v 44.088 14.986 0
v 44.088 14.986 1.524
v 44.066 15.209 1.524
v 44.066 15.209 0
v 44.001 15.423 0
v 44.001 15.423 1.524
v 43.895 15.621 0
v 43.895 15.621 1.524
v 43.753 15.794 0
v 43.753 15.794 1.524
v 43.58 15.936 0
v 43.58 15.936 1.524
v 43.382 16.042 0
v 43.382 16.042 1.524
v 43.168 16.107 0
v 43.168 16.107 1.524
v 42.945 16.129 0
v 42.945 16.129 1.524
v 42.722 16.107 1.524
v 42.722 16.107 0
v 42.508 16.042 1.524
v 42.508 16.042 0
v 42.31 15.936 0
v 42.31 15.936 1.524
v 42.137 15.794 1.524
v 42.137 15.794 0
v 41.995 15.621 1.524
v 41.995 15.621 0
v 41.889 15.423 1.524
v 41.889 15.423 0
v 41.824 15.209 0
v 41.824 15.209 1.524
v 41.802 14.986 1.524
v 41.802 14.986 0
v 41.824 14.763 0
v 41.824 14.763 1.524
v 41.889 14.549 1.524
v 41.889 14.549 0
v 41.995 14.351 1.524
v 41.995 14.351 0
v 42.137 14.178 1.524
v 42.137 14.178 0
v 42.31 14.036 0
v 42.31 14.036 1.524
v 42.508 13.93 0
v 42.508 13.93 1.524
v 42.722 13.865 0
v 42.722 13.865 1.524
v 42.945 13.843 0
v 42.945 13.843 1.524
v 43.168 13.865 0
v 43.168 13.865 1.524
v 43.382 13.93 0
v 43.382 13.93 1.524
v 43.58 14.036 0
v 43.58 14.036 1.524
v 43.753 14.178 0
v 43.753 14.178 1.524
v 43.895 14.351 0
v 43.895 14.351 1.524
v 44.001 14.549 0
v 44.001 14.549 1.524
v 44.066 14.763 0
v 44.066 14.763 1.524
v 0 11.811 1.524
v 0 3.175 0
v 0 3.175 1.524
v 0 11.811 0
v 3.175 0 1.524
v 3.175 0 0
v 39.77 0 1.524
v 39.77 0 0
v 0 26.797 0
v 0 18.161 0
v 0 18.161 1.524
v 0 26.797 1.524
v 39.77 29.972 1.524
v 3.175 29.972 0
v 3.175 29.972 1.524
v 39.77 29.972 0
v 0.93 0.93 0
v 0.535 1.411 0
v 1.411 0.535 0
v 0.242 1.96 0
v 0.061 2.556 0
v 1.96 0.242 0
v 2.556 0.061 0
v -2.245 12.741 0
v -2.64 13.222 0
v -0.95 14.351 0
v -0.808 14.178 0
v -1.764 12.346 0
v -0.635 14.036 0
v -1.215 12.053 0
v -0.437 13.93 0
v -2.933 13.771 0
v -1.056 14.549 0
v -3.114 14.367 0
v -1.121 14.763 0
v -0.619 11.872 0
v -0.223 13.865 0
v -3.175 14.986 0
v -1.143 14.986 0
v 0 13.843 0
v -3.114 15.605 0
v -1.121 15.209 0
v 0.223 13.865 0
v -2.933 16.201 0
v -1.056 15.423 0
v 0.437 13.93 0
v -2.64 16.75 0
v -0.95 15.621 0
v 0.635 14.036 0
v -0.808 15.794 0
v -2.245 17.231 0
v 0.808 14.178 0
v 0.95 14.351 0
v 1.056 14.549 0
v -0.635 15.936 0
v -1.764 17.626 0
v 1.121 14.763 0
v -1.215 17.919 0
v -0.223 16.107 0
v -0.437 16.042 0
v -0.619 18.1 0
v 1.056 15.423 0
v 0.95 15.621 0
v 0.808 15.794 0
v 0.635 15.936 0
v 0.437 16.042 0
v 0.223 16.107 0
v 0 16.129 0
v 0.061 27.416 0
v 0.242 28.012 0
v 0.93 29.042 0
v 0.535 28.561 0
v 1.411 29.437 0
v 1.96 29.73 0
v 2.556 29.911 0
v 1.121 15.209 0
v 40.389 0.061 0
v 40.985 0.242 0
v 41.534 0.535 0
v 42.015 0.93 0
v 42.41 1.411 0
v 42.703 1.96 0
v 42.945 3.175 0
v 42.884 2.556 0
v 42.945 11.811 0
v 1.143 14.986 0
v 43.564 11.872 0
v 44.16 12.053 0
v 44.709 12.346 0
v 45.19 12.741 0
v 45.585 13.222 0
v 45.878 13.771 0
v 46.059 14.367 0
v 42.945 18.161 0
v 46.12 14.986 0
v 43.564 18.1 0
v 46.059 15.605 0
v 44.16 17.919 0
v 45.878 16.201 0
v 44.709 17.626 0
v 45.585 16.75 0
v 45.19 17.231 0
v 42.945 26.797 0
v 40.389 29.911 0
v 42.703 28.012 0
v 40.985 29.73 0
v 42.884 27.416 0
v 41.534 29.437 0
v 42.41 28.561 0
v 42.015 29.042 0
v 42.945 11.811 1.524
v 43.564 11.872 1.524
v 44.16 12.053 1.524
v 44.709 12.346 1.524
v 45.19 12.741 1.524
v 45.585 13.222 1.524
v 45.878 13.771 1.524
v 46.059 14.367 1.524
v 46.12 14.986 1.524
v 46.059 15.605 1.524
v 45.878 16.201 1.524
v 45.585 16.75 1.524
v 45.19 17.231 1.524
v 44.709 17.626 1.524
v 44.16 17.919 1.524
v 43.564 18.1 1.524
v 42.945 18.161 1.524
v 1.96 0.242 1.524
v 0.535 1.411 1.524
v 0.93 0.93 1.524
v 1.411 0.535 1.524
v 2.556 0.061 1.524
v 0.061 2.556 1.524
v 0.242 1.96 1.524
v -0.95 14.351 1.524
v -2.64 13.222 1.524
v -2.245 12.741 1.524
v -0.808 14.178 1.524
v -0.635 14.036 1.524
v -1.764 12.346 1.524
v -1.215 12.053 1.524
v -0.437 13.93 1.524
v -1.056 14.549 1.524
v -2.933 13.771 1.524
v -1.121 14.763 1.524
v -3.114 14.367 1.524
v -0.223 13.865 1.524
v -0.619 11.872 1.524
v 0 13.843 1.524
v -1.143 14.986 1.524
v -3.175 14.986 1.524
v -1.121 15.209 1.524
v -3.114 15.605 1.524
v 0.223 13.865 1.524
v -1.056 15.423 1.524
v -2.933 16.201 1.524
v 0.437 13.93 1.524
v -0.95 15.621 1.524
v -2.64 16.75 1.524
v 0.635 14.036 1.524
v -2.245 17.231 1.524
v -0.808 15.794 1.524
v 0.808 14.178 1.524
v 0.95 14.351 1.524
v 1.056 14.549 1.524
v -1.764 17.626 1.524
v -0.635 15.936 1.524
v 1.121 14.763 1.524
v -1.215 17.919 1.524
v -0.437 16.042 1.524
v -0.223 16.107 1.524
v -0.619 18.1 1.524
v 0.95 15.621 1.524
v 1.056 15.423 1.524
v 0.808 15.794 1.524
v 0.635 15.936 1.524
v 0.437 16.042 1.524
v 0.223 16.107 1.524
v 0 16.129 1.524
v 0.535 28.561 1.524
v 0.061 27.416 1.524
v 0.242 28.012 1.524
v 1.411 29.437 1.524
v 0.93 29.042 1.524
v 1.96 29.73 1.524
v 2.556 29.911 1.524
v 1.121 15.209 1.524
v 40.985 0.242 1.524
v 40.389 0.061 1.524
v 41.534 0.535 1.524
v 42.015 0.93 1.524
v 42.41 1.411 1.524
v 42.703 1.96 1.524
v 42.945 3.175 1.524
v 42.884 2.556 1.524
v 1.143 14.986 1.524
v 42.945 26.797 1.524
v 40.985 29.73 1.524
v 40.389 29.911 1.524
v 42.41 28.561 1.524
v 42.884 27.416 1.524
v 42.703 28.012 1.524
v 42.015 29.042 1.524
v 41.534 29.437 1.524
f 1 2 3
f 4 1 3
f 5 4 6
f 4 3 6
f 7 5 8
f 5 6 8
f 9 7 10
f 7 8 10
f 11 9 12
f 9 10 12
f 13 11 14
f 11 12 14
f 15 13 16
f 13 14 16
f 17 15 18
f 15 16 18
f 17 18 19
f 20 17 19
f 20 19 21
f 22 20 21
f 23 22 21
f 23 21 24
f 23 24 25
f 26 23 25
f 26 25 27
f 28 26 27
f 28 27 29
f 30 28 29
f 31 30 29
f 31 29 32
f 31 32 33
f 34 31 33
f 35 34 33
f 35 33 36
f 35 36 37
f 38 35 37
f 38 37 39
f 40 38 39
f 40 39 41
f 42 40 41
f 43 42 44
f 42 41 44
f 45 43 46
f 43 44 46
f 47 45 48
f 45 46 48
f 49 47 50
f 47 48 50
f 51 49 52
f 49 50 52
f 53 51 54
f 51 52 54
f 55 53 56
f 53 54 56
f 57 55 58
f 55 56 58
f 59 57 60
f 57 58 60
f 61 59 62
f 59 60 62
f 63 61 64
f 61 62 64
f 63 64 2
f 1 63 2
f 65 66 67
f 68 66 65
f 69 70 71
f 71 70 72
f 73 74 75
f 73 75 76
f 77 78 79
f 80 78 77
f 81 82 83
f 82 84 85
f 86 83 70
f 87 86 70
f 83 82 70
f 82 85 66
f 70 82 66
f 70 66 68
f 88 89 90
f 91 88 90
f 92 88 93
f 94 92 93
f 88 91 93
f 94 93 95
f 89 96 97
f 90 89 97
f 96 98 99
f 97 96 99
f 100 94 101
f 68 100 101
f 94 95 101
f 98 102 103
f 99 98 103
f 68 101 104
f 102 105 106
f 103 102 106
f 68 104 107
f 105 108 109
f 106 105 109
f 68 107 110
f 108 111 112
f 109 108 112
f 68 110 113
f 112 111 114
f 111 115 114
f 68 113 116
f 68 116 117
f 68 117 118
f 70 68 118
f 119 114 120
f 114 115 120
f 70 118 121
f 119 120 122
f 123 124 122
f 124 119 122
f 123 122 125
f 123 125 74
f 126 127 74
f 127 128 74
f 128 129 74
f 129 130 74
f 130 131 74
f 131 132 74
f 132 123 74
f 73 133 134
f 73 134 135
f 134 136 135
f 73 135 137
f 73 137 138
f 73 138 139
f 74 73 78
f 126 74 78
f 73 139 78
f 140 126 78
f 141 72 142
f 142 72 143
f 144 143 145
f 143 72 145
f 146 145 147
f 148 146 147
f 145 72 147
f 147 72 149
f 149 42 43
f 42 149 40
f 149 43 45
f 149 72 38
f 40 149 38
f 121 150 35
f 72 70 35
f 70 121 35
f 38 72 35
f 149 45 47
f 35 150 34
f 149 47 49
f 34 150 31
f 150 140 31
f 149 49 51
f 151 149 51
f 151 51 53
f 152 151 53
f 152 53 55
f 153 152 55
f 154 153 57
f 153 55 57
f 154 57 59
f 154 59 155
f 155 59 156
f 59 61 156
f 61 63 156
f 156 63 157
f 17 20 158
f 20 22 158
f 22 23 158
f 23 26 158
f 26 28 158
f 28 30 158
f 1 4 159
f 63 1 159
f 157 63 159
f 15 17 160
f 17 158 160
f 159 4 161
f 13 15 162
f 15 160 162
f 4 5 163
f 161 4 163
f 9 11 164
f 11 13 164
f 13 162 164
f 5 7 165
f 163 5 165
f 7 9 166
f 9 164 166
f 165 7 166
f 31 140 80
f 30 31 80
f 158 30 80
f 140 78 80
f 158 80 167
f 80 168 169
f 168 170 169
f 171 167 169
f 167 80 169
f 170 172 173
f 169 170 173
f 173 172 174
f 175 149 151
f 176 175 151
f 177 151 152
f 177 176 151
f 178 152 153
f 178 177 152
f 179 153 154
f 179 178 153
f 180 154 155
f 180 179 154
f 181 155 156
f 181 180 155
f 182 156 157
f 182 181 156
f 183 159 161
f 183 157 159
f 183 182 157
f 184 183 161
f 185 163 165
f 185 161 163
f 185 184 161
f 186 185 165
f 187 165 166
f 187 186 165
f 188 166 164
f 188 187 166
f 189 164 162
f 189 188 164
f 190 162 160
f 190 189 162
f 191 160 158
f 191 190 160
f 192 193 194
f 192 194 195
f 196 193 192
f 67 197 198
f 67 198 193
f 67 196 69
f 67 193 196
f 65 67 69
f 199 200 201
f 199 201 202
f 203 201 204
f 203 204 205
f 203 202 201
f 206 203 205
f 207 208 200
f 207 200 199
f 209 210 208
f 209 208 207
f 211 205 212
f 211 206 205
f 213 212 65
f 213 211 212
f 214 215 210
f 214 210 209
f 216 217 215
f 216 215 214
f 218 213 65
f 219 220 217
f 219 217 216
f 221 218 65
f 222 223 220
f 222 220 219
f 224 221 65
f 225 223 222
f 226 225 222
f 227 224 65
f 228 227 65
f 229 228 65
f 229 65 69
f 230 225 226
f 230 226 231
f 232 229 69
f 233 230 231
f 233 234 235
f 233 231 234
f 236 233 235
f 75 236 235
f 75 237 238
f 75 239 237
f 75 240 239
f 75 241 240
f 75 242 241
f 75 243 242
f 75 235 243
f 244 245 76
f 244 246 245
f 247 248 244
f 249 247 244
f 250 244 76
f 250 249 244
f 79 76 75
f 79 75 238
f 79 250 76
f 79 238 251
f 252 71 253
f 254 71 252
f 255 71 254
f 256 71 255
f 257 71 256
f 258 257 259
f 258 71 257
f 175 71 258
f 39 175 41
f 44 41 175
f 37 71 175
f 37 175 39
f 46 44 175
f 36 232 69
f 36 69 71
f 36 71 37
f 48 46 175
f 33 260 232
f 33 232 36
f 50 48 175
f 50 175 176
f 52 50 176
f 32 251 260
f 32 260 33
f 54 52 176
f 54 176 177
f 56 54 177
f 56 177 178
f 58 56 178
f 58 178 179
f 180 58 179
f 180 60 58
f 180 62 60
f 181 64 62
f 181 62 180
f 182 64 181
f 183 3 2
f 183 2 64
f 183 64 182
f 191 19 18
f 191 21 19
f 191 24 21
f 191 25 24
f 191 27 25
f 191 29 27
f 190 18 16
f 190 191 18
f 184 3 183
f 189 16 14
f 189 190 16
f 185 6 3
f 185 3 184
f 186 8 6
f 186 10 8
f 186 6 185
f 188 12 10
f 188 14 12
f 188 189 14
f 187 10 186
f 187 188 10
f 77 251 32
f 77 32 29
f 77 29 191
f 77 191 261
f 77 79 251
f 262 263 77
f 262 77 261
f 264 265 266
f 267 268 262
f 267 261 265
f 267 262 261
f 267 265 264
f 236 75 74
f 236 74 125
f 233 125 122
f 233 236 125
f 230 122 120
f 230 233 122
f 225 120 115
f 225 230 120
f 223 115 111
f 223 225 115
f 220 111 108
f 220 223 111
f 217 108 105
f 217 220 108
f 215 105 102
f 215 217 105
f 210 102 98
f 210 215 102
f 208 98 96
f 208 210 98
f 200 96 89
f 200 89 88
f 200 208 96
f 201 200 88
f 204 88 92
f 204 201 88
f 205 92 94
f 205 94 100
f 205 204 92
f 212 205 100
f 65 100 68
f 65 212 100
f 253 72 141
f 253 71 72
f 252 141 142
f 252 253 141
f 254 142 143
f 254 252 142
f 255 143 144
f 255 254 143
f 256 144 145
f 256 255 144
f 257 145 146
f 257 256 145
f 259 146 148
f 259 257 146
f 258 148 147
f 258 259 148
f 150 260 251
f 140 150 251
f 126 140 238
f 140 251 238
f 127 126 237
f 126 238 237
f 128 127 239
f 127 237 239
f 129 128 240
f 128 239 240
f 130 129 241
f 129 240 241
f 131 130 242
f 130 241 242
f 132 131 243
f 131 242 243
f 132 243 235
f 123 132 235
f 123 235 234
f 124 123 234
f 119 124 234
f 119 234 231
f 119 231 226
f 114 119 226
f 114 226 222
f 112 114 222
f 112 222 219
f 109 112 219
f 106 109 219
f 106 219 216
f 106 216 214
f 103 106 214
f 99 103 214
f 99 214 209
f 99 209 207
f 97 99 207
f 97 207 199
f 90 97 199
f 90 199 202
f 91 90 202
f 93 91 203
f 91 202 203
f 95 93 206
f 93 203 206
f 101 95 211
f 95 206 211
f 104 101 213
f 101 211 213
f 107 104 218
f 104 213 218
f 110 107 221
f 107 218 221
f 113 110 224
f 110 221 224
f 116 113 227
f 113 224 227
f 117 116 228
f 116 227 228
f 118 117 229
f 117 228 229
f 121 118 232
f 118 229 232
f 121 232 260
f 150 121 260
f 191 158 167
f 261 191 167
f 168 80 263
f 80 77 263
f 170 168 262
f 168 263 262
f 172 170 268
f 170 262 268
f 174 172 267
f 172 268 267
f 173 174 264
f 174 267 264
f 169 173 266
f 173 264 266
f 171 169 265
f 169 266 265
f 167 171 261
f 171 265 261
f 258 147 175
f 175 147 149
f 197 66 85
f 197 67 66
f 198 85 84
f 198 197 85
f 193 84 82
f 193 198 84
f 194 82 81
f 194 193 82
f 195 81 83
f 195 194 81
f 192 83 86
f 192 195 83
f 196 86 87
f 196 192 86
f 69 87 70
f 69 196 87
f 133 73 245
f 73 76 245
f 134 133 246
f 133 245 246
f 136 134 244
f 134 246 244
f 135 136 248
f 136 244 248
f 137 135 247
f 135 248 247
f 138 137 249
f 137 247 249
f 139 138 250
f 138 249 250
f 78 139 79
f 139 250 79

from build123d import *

# Parameters (mm, degrees)
SKETCH1_W           = 42.9449992
SKETCH1_H           = 29.972
BOSS_EXTRUDE1_DEPTH = 1.524
SKETCH2_R           = 3.175
BOSS_EXTRUDE2_DEPTH = 1.524
SKETCH3_R           = 1.143
CUT_EXTRUDE1_DEPTH  = 56.024518955
FILLET1_R           = 3.175


with BuildPart() as part:
    # Sketch1 → Boss-Extrude1 (new body)
    with BuildSketch(Plane.XY):
        with Locations((21.4724996, 14.986)):
            Rectangle(SKETCH1_W, SKETCH1_H)
    extrude(amount=BOSS_EXTRUDE1_DEPTH)

    # Sketch2 → Boss-Extrude2 (add)
    with BuildSketch(Plane.XY.offset(1.524)):
        with Locations((0, 14.986)):
            Circle(SKETCH2_R)
        with Locations((42.9449992, 14.986)):
            Circle(SKETCH2_R)
    extrude(amount=-BOSS_EXTRUDE2_DEPTH)

    # Sketch3 → Cut-Extrude1 (cut, through all)
    with BuildSketch(Plane.XY.offset(1.524)):
        with Locations((0, 14.986)):
            Circle(SKETCH3_R)
        with Locations((42.9449992, 14.986)):
            Circle(SKETCH3_R)
    extrude(amount=-CUT_EXTRUDE1_DEPTH, mode=Mode.SUBTRACT)

    # Fillet1
    fillet1_edges = [part.edges().sort_by_distance(p)[0] for p in [
        (0, 29.972, 0.762),
        (42.9449992, 29.972, 0.762),
        (42.9449992, 0, 0.762),
        (0, 0, 0.762),
    ]]
    fillet(fillet1_edges, radius=FILLET1_R)


solid = part.part
